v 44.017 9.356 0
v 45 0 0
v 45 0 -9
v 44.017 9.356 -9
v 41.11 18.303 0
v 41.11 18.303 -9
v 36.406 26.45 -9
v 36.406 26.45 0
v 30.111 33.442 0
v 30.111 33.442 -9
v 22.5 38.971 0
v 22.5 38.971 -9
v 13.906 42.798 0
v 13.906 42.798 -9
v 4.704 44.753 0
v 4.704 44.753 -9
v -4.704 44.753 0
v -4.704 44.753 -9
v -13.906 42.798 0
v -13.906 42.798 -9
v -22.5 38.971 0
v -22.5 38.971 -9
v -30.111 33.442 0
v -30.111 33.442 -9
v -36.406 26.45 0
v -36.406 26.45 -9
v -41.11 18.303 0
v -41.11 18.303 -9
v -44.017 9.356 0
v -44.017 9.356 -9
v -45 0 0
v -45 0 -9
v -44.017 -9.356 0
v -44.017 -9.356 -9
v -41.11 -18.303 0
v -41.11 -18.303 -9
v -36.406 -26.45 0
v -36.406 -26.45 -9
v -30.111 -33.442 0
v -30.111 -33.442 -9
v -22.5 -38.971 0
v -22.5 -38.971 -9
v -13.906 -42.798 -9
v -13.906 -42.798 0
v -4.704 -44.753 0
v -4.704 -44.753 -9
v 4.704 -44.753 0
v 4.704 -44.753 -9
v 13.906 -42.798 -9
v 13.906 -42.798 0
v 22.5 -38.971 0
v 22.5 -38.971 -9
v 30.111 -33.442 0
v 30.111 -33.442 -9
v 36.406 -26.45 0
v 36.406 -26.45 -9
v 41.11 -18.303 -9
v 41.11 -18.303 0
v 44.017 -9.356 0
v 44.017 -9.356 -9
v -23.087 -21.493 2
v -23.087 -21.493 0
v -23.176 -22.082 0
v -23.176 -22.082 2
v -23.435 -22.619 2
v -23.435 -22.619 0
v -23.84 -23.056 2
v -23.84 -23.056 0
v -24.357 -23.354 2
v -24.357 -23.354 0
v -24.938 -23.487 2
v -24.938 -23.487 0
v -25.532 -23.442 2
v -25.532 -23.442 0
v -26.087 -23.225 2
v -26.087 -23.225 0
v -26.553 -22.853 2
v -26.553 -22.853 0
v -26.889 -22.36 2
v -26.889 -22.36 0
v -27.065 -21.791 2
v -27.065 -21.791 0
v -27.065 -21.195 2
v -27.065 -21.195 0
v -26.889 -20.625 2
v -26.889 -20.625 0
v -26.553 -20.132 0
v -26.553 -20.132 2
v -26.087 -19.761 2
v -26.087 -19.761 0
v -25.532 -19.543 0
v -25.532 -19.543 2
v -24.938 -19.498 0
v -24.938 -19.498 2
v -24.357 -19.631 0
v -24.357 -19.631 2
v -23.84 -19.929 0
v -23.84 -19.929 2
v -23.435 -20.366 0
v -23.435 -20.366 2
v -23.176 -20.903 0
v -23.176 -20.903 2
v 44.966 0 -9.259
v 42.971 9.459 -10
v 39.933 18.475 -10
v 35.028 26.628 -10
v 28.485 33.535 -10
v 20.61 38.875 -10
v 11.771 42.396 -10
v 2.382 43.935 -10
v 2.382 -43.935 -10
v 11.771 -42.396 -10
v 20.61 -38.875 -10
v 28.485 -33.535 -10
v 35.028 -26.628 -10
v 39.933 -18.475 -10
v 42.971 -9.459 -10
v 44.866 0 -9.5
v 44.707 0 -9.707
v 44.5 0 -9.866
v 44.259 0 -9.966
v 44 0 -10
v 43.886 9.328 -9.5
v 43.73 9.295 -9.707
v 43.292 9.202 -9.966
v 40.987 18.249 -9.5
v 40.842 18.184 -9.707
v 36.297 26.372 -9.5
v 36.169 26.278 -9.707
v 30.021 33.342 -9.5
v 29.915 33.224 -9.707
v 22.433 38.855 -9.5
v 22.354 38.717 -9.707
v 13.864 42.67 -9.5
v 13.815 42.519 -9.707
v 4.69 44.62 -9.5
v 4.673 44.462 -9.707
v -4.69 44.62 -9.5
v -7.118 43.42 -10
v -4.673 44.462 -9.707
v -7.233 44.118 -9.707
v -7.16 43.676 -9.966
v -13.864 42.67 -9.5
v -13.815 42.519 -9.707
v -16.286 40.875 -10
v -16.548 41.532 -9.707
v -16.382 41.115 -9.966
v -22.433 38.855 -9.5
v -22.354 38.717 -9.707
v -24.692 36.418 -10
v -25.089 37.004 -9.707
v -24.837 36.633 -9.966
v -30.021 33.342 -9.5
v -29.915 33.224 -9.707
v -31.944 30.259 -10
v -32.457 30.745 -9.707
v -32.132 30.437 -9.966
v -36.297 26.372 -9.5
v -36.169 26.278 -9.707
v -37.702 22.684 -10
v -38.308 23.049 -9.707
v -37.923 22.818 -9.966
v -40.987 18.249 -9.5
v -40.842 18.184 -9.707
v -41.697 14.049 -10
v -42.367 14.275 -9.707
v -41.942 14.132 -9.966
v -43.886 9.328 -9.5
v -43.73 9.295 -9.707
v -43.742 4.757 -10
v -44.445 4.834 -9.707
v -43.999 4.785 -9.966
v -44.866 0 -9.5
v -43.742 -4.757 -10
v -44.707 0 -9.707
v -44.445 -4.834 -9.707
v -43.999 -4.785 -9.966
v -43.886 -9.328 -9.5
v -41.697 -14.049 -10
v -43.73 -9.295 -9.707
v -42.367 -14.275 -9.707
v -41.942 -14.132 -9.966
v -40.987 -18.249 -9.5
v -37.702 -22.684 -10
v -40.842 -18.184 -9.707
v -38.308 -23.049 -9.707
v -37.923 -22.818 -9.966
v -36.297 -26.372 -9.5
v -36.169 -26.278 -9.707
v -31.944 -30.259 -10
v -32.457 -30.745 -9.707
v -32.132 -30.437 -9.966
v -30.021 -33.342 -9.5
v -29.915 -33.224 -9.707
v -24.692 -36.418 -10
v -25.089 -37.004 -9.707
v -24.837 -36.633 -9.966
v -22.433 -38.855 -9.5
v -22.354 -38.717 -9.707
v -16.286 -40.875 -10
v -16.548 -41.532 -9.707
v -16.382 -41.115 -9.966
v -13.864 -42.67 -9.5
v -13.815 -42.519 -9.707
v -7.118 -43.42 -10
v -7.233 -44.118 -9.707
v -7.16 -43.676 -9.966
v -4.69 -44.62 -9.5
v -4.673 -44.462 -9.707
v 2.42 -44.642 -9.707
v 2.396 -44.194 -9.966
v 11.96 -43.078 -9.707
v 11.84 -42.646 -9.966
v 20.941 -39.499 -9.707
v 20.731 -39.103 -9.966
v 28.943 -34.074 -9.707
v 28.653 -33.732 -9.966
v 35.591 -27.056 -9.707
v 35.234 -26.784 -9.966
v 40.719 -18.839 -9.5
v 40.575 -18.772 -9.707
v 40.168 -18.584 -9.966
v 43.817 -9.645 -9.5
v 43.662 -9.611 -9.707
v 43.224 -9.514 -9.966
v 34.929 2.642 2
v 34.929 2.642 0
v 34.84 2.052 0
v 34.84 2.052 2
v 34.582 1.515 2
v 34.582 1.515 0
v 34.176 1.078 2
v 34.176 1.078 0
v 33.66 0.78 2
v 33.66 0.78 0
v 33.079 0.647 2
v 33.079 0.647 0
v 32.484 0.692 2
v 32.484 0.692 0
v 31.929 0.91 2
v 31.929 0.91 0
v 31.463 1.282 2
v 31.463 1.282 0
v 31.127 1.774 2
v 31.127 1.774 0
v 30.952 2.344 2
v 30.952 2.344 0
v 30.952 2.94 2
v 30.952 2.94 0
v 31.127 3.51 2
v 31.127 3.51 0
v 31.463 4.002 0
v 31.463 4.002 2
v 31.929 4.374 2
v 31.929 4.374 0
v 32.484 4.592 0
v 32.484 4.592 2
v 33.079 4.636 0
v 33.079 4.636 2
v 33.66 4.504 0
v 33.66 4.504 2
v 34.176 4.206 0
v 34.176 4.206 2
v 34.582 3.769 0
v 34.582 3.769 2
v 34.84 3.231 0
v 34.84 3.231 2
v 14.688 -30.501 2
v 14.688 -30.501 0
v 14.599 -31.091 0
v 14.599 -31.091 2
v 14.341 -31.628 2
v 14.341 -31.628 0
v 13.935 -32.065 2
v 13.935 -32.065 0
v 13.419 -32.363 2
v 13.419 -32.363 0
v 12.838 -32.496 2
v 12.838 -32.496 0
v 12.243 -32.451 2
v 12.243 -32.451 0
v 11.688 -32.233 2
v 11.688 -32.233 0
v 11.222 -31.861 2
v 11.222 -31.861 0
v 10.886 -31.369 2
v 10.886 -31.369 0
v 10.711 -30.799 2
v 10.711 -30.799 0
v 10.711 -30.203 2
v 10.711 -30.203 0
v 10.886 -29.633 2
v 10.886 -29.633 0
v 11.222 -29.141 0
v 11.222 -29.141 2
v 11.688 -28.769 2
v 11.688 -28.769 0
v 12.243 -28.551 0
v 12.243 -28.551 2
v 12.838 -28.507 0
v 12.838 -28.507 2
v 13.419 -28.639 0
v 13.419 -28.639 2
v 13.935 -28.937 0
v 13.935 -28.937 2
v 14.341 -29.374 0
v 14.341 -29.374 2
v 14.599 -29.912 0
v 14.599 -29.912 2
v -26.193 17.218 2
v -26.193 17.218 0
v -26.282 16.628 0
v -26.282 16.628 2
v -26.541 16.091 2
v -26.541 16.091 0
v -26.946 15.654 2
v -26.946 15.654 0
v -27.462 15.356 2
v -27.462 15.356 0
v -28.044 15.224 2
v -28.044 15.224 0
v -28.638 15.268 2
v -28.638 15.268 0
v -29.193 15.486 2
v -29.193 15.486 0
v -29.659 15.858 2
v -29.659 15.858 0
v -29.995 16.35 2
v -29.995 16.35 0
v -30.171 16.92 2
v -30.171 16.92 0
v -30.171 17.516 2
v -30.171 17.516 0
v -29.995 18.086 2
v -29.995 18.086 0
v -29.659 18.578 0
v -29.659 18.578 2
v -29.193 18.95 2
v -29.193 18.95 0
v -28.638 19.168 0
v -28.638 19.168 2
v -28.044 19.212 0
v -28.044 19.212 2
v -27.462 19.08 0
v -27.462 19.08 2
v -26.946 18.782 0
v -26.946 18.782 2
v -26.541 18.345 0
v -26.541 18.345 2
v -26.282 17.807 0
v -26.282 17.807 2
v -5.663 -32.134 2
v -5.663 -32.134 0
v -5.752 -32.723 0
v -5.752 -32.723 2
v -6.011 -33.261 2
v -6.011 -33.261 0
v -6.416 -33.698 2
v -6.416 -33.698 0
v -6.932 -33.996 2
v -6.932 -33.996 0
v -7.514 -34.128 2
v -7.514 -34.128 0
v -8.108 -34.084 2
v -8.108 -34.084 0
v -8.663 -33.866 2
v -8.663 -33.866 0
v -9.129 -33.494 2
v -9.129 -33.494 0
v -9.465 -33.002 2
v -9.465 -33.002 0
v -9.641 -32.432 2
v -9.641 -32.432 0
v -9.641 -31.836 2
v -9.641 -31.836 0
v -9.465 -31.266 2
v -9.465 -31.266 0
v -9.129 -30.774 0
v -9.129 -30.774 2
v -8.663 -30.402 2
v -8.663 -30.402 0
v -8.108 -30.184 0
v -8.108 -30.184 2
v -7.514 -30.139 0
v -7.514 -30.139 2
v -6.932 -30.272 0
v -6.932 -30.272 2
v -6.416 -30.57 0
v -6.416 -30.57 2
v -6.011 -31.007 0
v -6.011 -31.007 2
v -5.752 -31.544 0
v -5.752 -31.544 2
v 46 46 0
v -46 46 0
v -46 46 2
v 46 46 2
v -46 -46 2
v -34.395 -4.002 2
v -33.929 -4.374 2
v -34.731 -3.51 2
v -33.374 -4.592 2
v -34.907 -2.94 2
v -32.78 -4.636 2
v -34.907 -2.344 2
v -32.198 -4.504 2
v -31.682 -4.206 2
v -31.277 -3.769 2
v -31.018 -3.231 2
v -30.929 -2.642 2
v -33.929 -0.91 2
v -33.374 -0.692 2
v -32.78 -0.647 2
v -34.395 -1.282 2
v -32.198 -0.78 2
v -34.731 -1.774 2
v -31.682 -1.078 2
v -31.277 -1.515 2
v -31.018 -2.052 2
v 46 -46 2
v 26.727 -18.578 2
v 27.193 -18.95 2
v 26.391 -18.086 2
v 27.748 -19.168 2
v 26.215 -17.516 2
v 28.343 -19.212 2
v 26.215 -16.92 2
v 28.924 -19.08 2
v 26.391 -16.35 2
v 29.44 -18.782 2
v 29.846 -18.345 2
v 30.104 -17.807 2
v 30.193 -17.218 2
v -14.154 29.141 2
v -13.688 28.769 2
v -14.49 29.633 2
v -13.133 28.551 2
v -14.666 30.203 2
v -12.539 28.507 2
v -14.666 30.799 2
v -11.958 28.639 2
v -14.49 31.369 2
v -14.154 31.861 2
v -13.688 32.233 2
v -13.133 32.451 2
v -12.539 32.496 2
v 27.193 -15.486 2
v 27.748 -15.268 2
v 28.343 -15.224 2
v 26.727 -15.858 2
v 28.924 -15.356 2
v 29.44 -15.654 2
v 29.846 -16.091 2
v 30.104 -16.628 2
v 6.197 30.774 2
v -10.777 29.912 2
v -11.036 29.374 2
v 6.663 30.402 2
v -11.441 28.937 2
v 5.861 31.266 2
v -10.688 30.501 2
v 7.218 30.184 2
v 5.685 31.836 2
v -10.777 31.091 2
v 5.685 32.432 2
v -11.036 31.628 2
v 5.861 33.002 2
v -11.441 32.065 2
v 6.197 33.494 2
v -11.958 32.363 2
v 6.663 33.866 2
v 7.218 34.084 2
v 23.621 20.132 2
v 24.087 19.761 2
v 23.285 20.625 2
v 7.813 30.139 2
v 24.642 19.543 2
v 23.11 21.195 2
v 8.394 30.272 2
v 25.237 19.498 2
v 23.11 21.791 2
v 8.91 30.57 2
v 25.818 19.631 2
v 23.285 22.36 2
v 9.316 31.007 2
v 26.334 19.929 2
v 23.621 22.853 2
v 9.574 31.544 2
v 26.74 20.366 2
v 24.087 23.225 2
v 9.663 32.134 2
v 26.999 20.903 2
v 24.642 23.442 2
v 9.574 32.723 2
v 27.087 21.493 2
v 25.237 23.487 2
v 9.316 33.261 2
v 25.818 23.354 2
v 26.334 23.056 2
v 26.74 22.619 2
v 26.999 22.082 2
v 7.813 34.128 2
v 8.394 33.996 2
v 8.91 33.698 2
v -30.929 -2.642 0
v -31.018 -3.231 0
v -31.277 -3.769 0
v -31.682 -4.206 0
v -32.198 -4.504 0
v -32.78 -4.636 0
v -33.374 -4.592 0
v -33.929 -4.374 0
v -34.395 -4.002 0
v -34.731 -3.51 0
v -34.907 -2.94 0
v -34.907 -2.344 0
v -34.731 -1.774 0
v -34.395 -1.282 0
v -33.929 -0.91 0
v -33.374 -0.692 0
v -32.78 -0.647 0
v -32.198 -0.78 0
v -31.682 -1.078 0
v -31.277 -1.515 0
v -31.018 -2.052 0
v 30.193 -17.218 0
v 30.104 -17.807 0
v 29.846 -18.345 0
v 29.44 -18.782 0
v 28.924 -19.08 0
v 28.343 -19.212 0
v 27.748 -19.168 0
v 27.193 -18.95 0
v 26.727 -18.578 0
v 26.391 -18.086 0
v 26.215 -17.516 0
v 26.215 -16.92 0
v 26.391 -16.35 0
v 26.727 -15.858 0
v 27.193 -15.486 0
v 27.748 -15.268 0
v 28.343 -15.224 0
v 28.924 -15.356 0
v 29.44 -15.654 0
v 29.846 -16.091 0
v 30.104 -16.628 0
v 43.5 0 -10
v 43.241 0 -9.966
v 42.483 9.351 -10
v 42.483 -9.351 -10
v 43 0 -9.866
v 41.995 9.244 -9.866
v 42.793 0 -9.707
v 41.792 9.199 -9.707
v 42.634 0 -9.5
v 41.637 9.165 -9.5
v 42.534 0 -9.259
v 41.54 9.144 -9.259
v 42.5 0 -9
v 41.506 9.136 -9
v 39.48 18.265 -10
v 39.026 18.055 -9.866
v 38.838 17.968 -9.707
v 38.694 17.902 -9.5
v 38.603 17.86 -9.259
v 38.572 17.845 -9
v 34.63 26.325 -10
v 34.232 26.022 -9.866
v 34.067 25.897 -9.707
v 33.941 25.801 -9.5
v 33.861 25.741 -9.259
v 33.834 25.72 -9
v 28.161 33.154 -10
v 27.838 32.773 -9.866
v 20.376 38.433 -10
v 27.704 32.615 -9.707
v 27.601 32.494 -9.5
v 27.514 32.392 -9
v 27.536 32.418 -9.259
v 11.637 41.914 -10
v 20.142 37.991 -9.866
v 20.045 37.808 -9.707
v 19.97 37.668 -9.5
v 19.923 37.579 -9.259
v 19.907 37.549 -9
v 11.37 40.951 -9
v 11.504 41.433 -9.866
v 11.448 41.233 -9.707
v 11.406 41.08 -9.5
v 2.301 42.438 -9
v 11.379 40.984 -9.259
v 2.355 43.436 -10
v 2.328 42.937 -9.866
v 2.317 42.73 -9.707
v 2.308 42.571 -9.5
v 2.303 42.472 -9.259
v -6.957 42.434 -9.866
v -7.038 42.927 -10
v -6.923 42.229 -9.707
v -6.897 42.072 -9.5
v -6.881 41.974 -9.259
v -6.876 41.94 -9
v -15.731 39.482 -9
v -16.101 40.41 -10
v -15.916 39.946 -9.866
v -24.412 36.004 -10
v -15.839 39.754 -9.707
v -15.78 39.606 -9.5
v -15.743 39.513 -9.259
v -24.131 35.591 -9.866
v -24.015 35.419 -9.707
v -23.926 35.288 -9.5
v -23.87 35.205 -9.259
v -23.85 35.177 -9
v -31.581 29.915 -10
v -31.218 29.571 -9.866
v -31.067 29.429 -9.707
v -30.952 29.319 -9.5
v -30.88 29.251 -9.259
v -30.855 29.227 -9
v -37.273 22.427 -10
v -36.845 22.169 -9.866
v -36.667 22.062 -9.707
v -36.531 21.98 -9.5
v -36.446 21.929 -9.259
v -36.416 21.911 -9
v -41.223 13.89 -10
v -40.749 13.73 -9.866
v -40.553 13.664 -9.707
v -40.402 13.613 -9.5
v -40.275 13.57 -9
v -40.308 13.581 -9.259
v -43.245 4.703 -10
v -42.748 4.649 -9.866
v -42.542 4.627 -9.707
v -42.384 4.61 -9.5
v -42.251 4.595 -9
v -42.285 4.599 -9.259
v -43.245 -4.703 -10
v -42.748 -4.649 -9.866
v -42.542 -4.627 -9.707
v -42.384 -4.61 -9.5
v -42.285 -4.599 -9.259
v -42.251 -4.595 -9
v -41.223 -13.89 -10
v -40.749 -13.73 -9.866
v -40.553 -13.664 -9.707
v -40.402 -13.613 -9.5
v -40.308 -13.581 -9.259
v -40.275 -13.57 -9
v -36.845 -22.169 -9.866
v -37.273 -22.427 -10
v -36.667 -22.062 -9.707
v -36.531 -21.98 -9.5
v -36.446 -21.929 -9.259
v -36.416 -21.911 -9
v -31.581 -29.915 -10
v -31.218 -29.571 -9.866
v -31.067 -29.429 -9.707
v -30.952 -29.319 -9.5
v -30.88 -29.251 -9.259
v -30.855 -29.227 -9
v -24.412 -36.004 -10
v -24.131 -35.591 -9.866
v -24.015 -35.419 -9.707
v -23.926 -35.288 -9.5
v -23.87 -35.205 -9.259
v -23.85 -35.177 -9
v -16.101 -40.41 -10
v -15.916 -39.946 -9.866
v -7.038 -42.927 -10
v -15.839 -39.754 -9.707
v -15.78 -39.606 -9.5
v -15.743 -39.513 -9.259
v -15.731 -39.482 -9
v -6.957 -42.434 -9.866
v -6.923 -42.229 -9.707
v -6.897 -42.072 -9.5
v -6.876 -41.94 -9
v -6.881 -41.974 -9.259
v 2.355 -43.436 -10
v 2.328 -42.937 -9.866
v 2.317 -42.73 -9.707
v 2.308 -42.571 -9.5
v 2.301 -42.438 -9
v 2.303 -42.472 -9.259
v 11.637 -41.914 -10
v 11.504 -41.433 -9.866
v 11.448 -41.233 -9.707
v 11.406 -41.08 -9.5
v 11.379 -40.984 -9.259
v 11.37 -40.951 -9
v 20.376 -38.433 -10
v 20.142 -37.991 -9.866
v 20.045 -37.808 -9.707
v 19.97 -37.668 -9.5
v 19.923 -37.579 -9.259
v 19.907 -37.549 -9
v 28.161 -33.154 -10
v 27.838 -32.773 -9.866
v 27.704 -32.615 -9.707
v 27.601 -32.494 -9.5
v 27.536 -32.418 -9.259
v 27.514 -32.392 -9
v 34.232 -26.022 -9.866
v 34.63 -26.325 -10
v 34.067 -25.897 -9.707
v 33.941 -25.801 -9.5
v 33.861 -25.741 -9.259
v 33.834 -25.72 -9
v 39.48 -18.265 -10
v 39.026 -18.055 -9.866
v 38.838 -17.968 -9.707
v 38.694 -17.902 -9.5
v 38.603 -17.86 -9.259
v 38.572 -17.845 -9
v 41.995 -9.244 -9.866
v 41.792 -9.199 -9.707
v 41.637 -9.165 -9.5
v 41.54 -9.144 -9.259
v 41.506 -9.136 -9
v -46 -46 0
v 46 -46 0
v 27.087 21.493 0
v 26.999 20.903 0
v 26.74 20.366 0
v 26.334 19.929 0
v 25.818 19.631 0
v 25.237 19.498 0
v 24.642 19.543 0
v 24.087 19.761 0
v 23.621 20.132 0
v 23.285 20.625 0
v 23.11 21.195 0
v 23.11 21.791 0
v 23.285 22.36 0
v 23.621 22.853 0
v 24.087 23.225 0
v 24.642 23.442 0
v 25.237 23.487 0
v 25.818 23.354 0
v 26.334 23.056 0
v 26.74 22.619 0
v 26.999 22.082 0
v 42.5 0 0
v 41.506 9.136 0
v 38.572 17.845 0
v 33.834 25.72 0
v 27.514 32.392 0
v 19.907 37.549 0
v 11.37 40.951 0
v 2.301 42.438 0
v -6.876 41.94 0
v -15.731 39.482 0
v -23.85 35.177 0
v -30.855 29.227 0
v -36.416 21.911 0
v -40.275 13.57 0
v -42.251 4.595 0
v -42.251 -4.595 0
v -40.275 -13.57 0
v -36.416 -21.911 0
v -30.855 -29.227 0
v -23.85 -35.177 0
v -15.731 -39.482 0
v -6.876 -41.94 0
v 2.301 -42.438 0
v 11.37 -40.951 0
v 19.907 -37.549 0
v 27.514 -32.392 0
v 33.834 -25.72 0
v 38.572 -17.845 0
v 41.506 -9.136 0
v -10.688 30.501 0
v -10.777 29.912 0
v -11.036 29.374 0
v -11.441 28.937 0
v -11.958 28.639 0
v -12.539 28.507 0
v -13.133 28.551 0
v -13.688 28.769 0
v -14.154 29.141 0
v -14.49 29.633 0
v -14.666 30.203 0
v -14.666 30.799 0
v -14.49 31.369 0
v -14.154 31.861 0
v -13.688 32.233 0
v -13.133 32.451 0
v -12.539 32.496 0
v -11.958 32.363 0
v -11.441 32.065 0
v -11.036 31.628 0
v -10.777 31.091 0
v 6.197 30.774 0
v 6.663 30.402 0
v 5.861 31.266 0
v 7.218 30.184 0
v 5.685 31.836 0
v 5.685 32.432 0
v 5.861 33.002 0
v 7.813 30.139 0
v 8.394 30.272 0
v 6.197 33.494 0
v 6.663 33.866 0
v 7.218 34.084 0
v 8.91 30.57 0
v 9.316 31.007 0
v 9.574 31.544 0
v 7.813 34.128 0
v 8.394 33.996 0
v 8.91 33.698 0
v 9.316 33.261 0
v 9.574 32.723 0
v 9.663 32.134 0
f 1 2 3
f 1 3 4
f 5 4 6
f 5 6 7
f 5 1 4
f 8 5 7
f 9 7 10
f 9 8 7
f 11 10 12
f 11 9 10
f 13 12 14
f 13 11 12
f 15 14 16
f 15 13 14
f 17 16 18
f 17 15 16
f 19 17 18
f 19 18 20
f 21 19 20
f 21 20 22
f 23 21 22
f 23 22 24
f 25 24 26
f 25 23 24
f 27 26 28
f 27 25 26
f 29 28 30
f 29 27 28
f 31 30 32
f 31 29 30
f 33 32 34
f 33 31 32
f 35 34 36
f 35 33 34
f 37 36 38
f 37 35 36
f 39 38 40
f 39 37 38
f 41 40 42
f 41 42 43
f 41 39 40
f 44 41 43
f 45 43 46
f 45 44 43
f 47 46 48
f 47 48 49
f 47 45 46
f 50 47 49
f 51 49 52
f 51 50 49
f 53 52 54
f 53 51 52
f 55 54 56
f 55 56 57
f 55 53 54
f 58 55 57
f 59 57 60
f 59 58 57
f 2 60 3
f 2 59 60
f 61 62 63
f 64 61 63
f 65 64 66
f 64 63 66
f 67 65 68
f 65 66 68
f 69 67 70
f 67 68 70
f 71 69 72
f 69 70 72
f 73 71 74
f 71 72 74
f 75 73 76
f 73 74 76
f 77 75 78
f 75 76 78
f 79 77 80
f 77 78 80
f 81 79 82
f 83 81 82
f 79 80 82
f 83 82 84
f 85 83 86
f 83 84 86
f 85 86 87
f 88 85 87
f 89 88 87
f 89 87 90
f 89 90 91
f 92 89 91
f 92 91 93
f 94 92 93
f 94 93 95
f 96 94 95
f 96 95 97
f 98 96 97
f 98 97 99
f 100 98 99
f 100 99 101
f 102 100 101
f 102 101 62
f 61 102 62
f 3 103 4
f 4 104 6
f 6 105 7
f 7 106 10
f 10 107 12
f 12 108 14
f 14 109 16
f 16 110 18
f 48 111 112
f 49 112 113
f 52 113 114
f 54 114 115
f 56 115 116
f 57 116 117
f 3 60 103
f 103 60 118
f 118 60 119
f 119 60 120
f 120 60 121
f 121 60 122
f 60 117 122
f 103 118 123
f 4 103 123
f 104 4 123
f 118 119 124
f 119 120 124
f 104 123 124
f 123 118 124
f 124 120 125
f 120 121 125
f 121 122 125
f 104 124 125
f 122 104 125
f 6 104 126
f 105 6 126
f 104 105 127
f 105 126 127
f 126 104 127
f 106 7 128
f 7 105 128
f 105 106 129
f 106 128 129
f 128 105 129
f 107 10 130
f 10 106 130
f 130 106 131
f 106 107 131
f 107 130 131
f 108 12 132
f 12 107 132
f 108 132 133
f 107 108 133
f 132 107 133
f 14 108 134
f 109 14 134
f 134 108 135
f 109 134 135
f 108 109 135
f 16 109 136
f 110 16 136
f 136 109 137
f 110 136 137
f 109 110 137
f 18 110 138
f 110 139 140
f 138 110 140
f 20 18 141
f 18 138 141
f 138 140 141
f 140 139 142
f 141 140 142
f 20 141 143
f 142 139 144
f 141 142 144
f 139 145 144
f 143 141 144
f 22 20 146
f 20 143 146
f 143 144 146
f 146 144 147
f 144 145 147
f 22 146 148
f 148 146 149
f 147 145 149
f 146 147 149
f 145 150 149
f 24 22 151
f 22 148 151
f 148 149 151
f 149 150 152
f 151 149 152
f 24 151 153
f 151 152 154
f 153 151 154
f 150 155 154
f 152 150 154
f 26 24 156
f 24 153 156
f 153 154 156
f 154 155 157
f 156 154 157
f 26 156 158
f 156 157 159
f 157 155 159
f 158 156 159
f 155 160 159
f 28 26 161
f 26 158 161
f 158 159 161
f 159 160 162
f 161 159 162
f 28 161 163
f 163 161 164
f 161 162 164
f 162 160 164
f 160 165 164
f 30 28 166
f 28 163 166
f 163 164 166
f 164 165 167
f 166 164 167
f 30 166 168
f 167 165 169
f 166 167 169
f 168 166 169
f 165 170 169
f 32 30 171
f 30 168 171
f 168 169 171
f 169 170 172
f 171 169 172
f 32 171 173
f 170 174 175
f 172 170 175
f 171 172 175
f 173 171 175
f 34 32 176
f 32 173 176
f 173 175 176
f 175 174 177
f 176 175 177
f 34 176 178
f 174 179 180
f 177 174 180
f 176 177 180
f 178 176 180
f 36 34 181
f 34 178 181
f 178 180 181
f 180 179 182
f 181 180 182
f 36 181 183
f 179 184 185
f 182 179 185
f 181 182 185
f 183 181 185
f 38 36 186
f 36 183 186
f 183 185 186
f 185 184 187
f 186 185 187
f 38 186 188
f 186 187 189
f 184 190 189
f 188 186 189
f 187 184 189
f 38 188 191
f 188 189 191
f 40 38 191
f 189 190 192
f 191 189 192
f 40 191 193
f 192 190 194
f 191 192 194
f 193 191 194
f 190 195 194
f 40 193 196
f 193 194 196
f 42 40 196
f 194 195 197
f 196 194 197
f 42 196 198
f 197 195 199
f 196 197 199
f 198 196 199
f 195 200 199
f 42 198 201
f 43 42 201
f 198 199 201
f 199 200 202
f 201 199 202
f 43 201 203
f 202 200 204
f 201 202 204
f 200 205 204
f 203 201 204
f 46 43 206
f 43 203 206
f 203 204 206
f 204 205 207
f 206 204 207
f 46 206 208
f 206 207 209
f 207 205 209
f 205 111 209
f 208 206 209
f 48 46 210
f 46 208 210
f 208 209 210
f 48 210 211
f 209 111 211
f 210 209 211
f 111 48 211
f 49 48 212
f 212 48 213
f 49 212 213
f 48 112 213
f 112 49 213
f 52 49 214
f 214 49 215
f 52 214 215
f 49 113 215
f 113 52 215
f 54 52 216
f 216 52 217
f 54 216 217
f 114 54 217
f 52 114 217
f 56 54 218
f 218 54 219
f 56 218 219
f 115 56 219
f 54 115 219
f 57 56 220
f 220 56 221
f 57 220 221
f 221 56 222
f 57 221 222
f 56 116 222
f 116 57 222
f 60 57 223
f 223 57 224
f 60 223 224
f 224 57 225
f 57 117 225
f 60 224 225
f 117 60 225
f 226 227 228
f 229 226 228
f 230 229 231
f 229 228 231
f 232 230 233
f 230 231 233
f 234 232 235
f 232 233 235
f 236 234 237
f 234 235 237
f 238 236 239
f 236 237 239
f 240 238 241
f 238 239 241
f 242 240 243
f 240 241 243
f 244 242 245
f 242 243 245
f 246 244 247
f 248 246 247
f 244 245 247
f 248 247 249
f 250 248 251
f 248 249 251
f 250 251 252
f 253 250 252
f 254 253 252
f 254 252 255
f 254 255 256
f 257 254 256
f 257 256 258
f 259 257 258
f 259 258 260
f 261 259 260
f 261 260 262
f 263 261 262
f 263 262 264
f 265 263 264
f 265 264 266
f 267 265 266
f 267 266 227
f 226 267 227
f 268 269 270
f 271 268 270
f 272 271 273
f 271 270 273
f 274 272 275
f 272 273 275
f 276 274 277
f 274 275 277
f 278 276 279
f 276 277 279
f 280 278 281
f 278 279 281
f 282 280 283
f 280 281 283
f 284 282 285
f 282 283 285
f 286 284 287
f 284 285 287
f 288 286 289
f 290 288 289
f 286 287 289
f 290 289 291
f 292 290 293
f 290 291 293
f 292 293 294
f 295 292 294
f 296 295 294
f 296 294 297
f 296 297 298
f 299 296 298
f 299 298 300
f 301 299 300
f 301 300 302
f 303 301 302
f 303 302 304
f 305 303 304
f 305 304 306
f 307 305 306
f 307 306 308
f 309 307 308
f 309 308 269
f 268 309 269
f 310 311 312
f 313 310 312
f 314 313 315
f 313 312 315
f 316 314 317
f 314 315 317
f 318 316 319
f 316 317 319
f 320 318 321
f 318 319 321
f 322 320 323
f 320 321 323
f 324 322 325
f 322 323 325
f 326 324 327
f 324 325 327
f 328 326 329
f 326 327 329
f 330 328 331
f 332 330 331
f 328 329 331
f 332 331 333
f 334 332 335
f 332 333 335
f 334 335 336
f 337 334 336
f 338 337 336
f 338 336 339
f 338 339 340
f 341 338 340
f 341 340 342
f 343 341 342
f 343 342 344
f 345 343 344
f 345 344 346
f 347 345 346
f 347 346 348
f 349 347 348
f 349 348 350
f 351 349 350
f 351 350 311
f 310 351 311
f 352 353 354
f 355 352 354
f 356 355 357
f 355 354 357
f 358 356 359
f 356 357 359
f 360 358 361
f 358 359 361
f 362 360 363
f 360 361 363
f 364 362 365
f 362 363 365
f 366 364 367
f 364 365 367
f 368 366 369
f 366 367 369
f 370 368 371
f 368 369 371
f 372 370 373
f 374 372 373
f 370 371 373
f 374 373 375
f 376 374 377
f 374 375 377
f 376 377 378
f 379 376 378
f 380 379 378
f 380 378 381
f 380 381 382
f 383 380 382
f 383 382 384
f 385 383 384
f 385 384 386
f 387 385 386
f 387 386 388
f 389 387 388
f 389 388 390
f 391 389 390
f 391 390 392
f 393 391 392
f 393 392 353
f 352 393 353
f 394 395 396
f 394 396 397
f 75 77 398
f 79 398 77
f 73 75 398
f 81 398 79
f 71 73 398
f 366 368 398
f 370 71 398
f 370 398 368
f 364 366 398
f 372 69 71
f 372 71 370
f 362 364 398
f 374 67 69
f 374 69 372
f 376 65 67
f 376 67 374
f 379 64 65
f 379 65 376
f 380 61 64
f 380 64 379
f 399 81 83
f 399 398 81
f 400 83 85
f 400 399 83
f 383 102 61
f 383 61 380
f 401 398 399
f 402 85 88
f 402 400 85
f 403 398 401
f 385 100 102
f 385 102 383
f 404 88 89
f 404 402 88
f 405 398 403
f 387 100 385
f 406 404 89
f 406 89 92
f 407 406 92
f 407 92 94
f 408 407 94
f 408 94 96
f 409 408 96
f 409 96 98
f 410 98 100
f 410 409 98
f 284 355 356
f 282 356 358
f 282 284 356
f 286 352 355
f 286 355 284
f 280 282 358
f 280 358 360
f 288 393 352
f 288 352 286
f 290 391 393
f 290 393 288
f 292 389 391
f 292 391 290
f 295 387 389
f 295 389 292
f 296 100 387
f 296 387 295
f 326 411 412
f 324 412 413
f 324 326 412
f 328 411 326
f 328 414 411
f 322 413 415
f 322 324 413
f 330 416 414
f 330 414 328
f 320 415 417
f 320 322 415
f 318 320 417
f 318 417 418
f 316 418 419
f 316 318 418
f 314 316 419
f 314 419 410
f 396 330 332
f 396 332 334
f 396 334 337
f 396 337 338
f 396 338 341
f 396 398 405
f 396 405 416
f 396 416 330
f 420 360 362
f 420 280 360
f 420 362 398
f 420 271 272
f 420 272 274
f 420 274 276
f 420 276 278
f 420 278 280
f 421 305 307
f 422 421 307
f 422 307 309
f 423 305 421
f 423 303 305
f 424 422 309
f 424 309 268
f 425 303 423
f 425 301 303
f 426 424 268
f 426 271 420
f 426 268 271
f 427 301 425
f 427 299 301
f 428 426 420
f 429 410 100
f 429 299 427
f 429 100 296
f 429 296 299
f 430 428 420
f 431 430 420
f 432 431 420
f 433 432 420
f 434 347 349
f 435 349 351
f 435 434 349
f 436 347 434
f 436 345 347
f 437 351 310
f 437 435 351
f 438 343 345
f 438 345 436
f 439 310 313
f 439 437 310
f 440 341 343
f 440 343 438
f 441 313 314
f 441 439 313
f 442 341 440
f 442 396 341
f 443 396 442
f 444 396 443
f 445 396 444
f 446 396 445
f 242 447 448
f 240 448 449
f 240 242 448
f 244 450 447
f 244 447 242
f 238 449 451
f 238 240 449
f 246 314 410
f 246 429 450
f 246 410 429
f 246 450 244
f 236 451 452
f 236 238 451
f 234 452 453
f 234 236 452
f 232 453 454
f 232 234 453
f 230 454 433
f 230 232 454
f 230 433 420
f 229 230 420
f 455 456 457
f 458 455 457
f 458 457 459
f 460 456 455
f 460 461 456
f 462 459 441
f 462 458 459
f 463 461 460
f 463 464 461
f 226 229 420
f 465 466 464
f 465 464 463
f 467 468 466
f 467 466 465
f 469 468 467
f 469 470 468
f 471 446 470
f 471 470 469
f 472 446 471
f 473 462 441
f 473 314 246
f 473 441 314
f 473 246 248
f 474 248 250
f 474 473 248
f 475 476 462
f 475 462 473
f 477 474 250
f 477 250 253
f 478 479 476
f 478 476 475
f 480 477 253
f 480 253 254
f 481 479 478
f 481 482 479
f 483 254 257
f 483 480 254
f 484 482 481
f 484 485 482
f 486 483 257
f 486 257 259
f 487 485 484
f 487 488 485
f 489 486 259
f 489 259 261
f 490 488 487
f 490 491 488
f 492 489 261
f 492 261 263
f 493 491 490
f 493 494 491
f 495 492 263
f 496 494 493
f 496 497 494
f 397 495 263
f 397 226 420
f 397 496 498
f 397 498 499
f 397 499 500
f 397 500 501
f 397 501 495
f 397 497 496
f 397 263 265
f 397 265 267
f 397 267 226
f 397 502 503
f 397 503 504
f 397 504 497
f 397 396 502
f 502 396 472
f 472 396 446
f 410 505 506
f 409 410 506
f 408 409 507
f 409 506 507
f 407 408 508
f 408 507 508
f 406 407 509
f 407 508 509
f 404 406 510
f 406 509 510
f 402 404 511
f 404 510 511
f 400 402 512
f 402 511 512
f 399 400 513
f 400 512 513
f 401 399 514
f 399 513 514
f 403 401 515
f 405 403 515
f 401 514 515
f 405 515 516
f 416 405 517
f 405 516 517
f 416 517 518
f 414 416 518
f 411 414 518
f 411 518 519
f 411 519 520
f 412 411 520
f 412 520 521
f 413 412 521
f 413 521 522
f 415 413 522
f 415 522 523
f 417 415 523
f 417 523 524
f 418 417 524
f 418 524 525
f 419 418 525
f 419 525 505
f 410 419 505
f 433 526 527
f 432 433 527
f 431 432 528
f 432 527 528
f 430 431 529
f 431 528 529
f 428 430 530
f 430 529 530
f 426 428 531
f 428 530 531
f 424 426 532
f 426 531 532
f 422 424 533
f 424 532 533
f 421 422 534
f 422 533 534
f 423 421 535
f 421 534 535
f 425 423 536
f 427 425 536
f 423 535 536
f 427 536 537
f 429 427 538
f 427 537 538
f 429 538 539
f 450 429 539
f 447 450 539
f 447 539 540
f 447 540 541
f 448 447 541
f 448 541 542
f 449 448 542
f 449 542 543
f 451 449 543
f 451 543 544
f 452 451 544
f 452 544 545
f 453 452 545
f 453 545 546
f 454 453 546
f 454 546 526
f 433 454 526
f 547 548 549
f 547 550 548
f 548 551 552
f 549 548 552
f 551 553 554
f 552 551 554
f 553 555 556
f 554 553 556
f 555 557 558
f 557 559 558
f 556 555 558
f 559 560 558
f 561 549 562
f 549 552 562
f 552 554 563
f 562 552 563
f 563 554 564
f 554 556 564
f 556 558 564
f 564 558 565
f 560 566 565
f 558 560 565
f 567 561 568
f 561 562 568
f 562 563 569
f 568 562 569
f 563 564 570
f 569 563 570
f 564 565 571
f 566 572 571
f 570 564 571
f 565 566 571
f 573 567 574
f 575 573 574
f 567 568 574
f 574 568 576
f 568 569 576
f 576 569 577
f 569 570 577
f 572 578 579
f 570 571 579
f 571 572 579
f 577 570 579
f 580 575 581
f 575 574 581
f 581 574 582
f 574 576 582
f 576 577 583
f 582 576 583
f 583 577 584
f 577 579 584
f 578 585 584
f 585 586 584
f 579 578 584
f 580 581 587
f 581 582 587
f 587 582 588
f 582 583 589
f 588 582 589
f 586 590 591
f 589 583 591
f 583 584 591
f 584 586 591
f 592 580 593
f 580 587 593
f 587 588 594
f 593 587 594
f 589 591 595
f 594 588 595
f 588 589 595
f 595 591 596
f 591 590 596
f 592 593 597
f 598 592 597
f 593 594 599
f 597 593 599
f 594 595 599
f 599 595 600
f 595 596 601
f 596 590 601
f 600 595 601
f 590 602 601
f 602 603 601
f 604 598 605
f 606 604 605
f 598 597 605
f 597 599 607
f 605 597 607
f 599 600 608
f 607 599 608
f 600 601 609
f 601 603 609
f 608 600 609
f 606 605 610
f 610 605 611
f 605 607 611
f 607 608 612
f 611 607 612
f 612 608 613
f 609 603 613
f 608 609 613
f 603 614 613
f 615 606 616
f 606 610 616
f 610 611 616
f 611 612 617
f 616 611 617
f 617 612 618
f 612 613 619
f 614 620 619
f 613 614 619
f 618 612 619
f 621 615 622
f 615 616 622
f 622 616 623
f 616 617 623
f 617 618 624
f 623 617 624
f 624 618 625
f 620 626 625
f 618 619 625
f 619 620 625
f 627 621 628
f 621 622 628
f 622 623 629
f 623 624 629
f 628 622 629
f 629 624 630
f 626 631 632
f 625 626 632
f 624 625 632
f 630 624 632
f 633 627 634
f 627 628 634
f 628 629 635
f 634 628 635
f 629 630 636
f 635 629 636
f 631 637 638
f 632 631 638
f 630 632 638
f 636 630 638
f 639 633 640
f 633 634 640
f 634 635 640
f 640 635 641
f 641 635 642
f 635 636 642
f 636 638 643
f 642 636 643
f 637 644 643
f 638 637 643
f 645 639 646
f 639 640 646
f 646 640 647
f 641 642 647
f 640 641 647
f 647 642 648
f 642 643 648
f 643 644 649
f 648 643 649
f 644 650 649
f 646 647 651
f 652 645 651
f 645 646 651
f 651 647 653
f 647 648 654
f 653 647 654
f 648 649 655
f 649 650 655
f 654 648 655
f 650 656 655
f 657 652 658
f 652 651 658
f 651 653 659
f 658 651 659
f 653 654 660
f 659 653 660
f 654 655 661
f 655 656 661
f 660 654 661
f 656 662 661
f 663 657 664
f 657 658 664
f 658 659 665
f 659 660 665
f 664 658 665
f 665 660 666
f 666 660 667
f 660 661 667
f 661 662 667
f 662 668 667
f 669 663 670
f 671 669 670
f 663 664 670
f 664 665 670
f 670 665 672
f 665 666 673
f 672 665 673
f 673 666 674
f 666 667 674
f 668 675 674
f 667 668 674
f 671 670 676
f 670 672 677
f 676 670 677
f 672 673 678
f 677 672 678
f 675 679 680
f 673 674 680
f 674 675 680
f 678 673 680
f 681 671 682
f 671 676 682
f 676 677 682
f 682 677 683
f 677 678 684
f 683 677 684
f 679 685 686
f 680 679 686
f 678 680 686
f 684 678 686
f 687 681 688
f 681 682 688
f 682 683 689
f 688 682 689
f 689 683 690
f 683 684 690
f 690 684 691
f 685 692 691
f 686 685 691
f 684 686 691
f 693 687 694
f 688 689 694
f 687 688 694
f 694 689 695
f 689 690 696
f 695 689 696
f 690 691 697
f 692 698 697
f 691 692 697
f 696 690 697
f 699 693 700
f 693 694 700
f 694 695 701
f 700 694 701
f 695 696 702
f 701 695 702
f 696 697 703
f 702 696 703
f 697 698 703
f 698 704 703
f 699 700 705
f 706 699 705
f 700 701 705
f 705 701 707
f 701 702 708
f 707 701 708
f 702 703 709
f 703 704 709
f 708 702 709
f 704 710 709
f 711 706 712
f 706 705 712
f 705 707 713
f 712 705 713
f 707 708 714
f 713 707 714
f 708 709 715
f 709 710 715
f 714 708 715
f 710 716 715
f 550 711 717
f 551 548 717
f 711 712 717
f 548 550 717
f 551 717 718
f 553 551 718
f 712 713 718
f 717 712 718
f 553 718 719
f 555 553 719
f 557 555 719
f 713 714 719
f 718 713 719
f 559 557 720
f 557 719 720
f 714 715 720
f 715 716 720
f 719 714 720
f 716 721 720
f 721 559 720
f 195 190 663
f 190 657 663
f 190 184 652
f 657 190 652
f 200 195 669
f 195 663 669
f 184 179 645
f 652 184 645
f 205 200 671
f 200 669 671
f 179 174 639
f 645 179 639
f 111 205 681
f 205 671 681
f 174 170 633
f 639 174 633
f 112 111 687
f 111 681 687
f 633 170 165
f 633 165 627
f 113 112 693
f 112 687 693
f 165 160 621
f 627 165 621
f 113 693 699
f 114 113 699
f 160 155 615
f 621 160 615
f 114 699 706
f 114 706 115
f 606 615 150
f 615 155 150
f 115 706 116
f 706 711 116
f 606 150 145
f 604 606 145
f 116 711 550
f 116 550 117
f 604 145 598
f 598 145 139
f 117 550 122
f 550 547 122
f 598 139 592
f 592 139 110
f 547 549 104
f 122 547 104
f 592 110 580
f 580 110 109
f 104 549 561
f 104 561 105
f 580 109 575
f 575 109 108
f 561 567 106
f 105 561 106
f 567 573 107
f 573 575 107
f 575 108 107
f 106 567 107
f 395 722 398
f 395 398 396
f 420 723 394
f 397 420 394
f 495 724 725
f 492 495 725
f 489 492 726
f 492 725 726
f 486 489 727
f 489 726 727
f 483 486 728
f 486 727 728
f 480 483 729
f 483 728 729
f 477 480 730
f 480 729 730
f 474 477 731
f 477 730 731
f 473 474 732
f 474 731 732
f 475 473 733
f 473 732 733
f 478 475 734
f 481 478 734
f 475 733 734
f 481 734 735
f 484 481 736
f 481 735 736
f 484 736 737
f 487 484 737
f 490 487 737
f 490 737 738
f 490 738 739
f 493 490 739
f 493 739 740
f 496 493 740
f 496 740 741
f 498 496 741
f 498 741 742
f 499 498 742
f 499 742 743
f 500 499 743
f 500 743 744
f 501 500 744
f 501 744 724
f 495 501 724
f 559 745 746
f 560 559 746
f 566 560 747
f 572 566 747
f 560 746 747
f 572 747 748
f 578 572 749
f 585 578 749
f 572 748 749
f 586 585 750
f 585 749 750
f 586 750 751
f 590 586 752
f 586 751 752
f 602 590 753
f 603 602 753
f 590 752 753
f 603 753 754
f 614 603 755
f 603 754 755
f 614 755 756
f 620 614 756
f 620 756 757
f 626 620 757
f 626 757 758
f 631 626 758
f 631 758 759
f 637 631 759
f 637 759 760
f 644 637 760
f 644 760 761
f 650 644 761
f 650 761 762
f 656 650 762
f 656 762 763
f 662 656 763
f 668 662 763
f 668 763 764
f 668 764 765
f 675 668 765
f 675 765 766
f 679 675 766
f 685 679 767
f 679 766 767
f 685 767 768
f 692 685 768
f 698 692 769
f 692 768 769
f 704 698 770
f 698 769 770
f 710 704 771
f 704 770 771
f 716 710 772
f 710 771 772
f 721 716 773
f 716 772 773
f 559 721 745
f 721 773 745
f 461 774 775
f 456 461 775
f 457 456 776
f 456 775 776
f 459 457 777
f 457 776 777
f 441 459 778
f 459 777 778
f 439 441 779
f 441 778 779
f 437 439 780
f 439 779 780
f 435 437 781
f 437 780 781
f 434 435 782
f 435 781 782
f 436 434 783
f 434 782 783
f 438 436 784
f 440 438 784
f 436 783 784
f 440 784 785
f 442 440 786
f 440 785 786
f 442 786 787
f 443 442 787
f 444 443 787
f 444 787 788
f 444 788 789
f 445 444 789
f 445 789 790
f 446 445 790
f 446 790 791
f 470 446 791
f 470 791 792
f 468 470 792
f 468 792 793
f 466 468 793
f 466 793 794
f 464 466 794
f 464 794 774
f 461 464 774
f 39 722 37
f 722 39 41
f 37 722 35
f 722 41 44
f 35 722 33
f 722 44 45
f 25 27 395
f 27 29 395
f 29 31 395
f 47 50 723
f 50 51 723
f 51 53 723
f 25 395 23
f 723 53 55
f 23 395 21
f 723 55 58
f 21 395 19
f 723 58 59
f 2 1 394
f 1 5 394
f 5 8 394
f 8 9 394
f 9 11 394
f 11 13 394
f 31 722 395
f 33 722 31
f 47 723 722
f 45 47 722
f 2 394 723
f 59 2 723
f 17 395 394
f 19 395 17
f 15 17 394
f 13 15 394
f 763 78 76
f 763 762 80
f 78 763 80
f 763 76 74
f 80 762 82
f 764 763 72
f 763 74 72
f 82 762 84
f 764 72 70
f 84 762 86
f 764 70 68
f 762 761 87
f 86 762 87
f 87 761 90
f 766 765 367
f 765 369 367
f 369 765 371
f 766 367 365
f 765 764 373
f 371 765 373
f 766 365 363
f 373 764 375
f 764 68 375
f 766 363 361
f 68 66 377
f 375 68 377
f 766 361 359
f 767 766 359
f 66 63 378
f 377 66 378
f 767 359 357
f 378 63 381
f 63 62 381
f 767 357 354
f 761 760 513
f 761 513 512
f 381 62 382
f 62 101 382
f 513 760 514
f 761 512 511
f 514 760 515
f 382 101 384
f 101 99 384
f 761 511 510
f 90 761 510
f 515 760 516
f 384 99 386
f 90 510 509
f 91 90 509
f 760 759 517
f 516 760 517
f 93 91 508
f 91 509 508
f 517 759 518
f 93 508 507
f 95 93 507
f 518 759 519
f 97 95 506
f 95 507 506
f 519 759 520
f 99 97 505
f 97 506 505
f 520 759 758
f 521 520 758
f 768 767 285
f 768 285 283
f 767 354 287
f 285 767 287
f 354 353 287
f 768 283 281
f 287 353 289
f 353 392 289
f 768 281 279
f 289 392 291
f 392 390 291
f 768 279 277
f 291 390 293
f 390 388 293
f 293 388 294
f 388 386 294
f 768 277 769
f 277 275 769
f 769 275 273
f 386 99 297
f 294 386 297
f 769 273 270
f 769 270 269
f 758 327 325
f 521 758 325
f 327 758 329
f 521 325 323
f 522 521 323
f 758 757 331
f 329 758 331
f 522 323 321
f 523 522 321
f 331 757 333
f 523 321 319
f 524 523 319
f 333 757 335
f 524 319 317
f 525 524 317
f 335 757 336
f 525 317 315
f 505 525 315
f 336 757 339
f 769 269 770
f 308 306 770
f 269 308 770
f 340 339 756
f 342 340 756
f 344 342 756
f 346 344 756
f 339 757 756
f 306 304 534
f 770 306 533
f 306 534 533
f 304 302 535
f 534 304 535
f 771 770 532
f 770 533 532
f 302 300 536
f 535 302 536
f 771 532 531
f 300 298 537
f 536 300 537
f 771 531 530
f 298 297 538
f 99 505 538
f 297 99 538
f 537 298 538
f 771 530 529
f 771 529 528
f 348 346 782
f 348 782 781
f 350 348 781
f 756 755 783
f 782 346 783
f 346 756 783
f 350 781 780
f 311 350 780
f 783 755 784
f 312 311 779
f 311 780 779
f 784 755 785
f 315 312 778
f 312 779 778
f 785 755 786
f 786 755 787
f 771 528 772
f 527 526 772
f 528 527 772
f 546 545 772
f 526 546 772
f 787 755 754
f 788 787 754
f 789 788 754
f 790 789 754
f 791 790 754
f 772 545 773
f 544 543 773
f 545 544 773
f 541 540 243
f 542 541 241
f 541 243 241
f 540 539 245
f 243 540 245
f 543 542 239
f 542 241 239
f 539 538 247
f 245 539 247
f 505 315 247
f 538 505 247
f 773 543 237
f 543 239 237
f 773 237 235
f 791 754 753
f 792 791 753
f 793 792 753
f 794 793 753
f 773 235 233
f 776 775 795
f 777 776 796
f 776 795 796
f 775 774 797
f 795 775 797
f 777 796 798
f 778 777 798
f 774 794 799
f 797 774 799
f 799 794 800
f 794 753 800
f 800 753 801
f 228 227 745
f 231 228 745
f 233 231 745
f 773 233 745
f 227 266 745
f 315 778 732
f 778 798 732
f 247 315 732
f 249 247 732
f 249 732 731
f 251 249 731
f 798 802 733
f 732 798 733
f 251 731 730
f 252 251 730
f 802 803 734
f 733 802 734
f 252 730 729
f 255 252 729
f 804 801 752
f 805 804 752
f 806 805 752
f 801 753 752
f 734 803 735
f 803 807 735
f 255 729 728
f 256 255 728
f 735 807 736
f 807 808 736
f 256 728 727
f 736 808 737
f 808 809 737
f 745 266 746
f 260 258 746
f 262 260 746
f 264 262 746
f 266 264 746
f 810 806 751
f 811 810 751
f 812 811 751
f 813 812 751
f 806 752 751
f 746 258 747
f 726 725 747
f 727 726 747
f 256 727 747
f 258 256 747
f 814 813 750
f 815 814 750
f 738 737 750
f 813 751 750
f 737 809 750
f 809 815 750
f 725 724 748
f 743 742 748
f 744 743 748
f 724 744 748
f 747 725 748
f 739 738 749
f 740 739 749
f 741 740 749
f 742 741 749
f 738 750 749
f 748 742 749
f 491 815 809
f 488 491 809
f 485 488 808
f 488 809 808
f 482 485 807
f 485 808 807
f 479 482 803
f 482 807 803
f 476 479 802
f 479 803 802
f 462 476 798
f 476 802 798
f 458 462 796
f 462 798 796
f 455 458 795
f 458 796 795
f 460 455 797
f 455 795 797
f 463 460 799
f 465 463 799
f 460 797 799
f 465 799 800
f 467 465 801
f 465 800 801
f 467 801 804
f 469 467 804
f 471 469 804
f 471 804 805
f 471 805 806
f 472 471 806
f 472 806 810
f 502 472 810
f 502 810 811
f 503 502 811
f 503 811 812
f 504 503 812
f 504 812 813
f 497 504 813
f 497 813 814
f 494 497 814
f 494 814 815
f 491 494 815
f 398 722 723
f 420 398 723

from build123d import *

# Parameters (mm, degrees)
F0_R     = 45
F1_DEPTH = 10
F2_T     = -2.5
F3_W     = 92
F3_H     = 92
F4_DEPTH = 2
F5_R     = 2
F6_DEPTH = 6
F7_R     = 1


with BuildPart() as f1:
    # F0 (on Top) → F1 (new body)
    with BuildSketch(Plane.XY):
        Circle(F0_R)
    extrude(amount=-F1_DEPTH)

    # F2
    f2_openings = [f1.faces().sort_by_distance(p)[0] for p in [
        (0, 0, 0),
        (0, 0, -10),
    ]]
    offset(amount=F2_T, openings=f2_openings)

    # F3 (on face) → F4 (join)
    with BuildSketch(Plane.XY):
        Rectangle(F3_W, F3_H)
    extrude(amount=F4_DEPTH)

    # F5 (on face) → F6 (cut)
    with BuildSketch(Plane(origin=(0, 0, 0), x_dir=(1, 0, 0), z_dir=(0, 0, -1))):
        with Locations((-7.6630815103, 32.1338913288)):
            Circle(F5_R)
        with Locations((12.6882642508, 30.5011104792)):
            Circle(F5_R)
        with Locations((28.1931243262, 17.2179421212)):
            Circle(F5_R)
        with Locations((32.9291691581, -2.6418949108)):
            Circle(F5_R)
        with Locations((25.0873905929, -21.4926178815)):
            Circle(F5_R)
        with Locations((-25.0873905929, 21.4926178815)):
            Circle(F5_R)
        with Locations((-32.9291691581, 2.6418949108)):
            Circle(F5_R)
        with Locations((-28.1931243262, -17.2179421212)):
            Circle(F5_R)
        with Locations((-12.6882642508, -30.5011104792)):
            Circle(F5_R)
        with Locations((7.6630815103, -32.1338913288)):
            Circle(F5_R)
    extrude(amount=-F6_DEPTH, mode=Mode.SUBTRACT)

    # F7
    f7_edges = [f1.edges().sort_by_distance(p)[0] for p in [
        (-45, 0, -10),
        (-42.5, 0, -10),
    ]]
    fillet(f7_edges, radius=F7_R)


solid = f1.part
